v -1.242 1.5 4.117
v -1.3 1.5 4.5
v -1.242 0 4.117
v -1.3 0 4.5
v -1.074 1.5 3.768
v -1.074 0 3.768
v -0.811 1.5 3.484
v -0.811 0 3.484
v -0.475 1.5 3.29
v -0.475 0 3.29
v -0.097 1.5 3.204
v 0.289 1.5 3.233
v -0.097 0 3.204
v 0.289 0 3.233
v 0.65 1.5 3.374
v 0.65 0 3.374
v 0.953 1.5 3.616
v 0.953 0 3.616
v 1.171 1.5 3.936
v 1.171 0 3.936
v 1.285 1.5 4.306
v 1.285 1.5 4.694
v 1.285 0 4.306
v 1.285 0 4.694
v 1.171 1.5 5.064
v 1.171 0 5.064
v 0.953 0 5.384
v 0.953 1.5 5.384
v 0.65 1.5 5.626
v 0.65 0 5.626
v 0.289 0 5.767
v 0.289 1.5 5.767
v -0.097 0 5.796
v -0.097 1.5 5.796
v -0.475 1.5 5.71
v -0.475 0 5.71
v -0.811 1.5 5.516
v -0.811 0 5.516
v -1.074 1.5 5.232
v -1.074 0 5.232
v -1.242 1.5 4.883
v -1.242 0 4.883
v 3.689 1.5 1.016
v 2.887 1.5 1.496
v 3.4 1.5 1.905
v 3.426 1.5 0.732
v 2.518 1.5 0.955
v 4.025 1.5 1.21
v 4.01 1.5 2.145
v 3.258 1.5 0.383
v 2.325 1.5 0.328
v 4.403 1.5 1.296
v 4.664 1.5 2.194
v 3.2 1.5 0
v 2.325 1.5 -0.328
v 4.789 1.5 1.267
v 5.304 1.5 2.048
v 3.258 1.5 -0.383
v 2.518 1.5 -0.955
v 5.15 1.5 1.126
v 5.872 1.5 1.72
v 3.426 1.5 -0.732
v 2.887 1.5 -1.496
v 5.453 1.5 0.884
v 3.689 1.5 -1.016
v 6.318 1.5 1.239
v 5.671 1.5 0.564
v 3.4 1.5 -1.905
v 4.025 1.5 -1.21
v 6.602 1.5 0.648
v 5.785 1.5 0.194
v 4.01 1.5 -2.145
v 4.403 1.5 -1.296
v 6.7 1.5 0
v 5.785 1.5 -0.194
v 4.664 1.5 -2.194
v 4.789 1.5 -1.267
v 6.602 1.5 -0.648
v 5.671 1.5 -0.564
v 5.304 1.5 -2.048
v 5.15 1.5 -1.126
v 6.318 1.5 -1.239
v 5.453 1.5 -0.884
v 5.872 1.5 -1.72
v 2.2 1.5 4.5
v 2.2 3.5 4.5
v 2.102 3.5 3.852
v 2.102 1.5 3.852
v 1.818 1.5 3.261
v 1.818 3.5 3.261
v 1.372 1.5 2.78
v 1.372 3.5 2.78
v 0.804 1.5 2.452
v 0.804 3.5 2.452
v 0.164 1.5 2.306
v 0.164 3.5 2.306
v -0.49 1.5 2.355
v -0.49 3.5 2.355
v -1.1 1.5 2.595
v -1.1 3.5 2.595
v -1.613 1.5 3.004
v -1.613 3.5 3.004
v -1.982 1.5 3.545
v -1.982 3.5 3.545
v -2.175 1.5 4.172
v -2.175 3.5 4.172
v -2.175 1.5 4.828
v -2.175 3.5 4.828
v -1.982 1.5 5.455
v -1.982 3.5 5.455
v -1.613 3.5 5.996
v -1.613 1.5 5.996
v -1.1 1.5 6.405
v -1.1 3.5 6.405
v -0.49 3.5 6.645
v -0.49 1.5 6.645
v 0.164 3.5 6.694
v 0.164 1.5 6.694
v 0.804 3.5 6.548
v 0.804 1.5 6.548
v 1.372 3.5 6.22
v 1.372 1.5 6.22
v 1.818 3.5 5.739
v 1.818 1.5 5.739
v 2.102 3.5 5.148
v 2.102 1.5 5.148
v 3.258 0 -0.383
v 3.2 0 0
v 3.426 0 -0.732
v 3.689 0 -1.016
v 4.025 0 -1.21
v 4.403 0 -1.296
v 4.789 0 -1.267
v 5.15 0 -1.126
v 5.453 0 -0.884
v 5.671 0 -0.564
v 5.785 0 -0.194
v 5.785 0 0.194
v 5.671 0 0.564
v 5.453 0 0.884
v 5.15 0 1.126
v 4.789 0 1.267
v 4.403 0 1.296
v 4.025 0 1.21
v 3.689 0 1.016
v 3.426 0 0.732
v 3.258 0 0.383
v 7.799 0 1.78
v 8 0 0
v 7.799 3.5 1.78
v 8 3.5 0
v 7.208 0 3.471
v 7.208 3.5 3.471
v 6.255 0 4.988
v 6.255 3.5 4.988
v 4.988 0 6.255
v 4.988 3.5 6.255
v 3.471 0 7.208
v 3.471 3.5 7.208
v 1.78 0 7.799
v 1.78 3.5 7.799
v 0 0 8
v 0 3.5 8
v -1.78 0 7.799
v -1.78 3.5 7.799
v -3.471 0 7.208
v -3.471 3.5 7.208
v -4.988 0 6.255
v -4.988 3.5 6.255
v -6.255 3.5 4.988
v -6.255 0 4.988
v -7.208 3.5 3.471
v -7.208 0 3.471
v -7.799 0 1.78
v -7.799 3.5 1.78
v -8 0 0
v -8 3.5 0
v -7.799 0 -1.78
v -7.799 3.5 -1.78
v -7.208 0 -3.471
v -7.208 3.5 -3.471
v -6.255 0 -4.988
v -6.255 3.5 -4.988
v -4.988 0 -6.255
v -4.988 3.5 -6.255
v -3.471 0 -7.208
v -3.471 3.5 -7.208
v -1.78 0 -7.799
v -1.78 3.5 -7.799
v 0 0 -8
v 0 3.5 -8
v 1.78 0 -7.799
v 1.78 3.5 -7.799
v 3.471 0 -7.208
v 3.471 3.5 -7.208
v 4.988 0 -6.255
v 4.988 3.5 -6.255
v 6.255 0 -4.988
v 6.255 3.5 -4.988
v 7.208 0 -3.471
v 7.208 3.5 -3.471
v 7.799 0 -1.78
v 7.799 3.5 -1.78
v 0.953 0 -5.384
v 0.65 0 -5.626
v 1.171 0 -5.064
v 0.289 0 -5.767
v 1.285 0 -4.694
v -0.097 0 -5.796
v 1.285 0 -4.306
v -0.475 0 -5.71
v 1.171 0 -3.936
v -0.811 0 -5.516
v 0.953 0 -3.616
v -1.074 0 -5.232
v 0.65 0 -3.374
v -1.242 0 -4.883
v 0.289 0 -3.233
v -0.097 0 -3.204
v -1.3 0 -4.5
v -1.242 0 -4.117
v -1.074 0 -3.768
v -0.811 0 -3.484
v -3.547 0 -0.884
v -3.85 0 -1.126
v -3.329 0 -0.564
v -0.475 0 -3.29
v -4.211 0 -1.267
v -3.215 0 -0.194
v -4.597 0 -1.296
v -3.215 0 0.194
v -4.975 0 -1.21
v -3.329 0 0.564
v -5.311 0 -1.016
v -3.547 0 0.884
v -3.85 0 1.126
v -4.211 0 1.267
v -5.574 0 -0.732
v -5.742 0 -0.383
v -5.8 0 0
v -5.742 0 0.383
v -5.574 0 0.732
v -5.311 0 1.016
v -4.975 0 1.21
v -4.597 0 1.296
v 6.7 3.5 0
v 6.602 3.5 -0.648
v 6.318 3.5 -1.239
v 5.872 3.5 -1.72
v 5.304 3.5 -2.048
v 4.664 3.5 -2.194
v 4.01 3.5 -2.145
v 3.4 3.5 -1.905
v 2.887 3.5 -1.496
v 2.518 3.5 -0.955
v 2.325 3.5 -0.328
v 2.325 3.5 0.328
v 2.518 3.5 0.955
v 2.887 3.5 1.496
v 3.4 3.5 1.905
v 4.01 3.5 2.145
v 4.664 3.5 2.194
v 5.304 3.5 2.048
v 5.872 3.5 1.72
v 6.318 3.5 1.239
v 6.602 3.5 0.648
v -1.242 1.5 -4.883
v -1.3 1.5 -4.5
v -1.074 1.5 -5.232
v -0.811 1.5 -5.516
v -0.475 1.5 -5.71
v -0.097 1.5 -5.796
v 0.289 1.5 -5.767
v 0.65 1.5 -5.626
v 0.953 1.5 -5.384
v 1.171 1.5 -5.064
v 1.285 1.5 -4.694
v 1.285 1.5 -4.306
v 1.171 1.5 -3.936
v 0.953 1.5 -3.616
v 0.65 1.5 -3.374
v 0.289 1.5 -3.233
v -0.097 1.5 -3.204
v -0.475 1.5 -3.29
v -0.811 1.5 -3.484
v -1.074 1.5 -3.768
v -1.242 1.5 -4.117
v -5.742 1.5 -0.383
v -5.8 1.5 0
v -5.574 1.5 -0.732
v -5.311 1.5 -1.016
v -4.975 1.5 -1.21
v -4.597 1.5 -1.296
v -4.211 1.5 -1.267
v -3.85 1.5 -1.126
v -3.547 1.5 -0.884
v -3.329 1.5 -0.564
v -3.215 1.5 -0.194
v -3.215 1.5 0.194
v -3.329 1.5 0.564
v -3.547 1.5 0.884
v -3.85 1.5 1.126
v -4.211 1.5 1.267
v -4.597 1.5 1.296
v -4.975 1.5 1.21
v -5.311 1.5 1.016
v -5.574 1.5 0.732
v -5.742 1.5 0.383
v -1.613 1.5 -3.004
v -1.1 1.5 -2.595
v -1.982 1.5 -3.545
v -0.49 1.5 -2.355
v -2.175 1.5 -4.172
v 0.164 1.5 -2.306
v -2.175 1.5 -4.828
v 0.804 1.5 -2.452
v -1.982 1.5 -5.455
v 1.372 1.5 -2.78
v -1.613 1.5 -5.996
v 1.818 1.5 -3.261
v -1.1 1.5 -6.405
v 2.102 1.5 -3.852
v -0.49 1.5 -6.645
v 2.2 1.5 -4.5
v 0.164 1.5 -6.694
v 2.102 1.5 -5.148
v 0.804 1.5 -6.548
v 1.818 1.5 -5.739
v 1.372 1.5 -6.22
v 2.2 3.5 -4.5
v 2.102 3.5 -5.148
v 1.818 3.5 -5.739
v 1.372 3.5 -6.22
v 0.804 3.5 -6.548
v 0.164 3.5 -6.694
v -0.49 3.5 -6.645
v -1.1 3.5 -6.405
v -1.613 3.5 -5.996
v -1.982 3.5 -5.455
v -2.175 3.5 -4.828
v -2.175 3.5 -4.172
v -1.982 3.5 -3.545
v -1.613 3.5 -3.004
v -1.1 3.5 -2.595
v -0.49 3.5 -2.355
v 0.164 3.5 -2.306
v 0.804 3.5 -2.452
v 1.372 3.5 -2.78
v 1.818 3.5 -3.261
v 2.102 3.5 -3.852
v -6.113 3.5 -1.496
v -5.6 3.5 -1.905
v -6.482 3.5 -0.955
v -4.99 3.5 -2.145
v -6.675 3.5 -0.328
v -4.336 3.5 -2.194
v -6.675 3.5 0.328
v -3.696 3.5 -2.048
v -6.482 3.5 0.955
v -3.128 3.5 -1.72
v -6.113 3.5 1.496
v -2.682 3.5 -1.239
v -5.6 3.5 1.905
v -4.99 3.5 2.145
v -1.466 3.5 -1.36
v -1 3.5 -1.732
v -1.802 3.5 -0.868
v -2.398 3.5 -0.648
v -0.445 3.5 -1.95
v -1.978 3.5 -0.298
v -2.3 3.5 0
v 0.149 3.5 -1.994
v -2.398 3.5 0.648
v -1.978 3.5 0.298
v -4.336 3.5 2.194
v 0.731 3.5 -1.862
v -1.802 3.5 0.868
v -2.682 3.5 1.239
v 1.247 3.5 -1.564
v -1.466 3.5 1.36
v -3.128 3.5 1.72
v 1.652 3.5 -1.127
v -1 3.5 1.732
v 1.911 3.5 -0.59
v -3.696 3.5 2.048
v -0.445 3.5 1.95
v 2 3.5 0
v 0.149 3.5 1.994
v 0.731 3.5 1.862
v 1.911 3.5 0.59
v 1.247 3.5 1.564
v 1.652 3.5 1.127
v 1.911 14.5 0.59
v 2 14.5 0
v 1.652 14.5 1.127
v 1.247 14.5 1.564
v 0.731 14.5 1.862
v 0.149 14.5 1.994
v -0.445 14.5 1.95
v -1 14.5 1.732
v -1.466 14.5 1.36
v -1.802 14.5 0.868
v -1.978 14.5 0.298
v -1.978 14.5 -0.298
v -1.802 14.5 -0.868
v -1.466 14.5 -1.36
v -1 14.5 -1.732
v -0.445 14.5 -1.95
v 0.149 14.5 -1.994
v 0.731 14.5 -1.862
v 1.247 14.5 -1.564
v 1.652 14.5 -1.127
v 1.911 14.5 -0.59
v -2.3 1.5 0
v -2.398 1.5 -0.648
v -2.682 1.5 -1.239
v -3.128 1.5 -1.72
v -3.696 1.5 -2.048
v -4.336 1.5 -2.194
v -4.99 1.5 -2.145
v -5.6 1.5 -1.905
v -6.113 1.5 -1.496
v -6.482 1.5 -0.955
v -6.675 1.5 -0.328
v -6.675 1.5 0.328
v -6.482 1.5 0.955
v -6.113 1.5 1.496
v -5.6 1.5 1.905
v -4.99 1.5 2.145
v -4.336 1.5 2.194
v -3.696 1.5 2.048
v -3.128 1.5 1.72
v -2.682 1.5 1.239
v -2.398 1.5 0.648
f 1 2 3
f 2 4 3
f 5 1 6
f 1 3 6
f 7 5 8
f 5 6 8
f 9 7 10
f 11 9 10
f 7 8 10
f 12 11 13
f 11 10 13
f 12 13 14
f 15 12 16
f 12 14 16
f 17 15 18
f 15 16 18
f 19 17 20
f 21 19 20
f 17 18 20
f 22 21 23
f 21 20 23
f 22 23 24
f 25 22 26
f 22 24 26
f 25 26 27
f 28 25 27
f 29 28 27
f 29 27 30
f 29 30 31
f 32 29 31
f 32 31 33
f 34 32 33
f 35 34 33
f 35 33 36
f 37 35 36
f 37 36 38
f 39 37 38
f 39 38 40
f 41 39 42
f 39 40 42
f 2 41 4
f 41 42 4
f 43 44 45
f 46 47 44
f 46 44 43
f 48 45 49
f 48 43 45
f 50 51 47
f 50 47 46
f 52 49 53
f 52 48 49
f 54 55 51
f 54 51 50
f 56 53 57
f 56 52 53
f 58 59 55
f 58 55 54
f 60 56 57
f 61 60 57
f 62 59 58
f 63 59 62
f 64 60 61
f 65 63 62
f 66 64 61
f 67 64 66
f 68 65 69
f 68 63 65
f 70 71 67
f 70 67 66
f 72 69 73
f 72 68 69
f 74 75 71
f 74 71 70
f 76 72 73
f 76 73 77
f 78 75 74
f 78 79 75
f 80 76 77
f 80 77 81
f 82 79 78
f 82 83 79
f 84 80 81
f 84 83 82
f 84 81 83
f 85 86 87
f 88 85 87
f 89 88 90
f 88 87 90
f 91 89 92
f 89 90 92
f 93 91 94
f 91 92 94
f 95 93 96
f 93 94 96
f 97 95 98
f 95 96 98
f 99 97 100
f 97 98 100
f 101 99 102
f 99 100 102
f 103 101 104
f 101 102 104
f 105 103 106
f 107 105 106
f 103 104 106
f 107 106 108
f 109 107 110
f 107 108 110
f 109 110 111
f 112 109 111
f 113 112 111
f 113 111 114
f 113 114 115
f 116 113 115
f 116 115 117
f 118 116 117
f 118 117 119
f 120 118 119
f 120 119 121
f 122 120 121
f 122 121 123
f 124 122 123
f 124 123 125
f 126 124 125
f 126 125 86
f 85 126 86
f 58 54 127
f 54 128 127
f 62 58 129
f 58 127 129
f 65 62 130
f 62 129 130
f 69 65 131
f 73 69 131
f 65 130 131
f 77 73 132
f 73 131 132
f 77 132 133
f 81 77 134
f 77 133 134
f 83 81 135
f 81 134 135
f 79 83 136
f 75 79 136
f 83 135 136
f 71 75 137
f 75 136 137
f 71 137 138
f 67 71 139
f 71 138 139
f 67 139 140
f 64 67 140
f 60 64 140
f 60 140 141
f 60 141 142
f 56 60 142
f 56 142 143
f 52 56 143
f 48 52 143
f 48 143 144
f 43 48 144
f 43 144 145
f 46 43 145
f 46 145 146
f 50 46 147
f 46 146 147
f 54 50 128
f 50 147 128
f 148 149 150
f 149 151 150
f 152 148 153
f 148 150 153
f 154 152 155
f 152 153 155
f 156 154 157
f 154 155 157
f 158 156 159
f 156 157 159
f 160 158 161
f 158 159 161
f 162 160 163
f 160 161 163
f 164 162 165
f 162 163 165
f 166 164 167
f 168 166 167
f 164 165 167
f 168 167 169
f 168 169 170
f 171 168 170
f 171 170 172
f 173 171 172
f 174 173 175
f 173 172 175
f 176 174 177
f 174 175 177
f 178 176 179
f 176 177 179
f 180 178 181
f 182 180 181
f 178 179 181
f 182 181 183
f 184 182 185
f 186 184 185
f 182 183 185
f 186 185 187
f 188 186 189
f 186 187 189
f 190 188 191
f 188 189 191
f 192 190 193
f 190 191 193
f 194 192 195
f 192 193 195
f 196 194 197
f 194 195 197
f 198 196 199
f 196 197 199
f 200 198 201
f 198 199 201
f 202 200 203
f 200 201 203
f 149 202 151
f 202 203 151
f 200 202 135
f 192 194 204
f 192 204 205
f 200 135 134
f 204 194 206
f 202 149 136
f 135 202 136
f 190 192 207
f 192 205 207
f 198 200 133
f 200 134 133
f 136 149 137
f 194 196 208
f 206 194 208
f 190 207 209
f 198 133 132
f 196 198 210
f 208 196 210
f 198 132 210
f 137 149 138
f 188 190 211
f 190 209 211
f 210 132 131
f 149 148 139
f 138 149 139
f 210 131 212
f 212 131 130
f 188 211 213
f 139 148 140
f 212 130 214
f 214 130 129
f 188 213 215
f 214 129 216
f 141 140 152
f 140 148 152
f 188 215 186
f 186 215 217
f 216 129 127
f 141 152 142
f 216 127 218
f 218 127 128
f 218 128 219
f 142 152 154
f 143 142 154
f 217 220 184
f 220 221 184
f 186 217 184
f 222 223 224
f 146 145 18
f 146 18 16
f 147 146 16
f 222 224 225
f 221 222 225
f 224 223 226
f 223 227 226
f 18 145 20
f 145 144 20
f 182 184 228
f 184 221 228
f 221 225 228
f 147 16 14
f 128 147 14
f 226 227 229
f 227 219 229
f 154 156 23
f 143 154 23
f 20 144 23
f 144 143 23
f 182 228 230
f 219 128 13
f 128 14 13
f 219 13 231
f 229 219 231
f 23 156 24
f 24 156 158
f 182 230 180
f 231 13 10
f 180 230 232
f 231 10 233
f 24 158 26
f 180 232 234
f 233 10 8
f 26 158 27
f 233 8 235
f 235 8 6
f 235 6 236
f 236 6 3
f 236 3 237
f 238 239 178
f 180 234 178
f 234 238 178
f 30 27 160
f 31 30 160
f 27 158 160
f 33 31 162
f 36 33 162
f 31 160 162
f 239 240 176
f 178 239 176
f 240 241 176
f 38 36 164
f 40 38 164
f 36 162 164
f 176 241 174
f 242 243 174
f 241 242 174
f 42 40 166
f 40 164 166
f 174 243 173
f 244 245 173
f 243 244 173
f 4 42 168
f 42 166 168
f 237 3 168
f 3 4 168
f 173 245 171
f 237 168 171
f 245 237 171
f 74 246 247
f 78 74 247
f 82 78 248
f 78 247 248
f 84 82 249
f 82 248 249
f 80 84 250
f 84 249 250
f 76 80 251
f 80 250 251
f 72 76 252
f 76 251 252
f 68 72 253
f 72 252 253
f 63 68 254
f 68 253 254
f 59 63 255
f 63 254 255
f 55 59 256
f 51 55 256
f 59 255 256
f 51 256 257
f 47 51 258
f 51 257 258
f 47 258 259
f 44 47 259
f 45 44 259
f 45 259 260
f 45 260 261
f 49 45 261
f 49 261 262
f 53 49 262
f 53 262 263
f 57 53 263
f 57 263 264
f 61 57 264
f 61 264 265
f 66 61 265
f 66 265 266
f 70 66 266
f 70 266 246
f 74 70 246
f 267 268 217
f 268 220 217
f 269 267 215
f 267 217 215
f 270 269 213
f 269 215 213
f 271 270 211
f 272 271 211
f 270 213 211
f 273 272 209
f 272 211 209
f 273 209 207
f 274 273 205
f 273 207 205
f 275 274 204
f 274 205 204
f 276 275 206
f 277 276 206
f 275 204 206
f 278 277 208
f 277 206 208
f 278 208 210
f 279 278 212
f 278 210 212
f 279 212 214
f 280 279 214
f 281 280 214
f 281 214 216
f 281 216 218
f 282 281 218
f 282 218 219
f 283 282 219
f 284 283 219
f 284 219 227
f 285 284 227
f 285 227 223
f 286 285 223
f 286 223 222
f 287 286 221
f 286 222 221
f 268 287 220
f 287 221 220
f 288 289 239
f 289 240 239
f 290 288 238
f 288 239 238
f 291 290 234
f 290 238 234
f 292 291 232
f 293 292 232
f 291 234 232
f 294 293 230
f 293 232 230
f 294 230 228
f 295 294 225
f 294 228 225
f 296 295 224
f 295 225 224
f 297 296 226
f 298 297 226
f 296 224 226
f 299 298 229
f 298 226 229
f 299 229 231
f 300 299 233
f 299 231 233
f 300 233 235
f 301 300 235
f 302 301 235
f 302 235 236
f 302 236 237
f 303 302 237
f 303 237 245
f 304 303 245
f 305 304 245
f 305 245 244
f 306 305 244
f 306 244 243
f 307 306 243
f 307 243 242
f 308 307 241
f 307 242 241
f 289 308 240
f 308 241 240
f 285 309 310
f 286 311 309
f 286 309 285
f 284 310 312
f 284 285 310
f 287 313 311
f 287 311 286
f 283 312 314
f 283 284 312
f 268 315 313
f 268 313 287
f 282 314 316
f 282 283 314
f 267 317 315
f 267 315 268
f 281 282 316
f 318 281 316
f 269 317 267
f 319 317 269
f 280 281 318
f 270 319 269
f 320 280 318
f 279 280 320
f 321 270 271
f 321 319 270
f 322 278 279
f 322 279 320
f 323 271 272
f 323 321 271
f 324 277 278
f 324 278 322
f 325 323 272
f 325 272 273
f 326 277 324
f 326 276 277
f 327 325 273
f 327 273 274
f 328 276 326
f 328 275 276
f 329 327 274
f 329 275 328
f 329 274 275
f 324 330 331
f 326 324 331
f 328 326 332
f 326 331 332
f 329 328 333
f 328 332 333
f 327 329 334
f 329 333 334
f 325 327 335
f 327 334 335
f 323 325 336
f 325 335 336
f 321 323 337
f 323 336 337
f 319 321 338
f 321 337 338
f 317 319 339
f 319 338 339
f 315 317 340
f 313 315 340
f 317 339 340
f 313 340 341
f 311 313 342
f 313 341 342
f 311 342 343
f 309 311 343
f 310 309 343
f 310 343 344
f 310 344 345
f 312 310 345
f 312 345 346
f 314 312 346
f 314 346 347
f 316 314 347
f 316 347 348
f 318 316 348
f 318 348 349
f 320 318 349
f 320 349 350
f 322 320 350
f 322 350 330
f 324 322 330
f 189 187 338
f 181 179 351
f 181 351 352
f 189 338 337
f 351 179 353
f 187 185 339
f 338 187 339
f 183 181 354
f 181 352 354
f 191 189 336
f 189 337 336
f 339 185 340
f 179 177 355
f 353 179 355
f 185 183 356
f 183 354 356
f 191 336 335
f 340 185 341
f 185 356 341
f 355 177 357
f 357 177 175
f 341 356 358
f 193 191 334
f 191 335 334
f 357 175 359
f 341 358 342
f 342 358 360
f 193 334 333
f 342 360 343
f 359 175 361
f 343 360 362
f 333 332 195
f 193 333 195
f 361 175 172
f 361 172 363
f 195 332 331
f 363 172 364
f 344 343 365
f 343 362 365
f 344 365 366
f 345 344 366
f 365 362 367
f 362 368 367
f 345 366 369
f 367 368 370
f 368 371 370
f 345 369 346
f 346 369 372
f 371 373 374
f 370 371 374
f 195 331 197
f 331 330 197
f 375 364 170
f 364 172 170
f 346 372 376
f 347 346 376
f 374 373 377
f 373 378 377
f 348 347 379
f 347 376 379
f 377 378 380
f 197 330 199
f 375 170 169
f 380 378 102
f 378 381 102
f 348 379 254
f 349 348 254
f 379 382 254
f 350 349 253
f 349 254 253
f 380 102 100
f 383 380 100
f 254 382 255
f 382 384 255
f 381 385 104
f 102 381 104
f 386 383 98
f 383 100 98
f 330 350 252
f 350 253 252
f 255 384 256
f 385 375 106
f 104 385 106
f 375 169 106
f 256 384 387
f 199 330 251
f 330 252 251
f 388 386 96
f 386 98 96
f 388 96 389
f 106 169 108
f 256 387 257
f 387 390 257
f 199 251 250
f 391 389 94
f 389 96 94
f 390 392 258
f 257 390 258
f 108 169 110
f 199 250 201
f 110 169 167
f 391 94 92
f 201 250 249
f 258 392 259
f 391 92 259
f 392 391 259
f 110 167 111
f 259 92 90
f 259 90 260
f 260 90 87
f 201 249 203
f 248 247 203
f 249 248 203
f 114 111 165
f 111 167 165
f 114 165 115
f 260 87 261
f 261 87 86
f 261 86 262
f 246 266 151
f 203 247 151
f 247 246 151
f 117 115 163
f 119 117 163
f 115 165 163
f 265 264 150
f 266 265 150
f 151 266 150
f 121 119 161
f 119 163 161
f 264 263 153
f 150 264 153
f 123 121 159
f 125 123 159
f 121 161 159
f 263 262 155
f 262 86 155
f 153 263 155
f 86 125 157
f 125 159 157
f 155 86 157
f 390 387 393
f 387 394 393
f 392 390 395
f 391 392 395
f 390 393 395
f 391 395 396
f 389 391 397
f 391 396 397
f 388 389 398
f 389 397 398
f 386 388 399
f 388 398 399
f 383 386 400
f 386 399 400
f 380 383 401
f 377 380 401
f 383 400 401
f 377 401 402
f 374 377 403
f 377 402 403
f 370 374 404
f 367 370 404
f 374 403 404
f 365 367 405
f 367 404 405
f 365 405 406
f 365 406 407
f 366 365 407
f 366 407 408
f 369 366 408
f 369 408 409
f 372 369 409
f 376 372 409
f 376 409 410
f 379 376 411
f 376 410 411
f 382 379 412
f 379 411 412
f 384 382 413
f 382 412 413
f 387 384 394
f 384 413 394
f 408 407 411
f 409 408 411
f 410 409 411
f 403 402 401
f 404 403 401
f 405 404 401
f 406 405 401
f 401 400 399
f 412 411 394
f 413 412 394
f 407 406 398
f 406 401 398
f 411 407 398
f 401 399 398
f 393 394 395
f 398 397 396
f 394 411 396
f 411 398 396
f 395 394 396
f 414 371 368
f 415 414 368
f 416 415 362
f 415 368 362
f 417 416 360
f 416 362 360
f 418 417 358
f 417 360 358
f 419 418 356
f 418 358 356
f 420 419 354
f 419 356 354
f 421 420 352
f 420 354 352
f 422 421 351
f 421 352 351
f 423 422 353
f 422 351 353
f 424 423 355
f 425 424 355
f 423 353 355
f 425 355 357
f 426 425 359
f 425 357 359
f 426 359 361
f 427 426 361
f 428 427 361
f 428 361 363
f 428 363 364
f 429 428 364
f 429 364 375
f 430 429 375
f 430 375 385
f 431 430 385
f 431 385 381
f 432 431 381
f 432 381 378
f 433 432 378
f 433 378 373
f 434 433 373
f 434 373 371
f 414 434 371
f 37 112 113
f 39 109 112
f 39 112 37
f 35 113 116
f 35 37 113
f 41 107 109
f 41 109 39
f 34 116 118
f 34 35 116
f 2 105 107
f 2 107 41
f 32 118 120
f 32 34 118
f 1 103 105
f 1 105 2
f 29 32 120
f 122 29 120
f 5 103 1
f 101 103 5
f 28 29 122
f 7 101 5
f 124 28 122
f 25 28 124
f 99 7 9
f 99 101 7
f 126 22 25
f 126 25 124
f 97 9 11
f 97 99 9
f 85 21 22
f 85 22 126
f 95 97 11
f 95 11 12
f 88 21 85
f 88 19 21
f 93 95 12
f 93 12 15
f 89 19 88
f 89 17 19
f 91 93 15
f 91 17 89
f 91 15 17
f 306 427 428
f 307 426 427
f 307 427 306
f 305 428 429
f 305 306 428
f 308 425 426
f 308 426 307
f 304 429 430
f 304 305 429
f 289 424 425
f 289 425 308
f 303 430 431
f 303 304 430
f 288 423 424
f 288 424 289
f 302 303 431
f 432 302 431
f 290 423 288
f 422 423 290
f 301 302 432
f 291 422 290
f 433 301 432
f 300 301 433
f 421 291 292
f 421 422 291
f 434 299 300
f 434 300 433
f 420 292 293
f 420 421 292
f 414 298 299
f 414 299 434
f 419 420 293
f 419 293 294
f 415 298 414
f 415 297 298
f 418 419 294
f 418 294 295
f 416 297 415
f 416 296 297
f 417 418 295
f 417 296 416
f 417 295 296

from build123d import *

# Parameters (mm, degrees)
CBORE_FOR_M2_SHCS1_D           = 2.6
CBORE_FOR_M2_SHCS1_DEPTH       = 5
CBORE_FOR_M2_SHCS1_CBORE_D     = 4.4
CBORE_FOR_M2_SHCS1_CBORE_DEPTH = 2
CBORE_FOR_M2_SHCS1_TIP         = 0.781118805


with BuildPart() as part:
    # Sketch1 → Revolve1 (revolve)
    with BuildSketch(Plane.XY):
        Polygon((0, 0), (8, 0), (8, 3.5), (2, 3.5), (2, 14.5), (0, 14.5), align=None)
    revolve(axis=Axis((0, 14.5, 0), (0, -1, 0)))

    # CBORE for M2 SHCS1
    with Locations(Plane(origin=(-4.5, 3.5, 0), x_dir=(1, 0, 0), z_dir=(0, 1, 0))):
        with Locations((0, 0), (4.5, 4.5), (9, 0), (4.5, -4.5)):
            CounterBoreHole(CBORE_FOR_M2_SHCS1_D / 2, CBORE_FOR_M2_SHCS1_CBORE_D / 2, CBORE_FOR_M2_SHCS1_CBORE_DEPTH, depth=CBORE_FOR_M2_SHCS1_DEPTH)
            with Locations((0, 0, -(CBORE_FOR_M2_SHCS1_DEPTH + CBORE_FOR_M2_SHCS1_TIP / 2))):  # 118° drill point
                Cone(0, CBORE_FOR_M2_SHCS1_D / 2, CBORE_FOR_M2_SHCS1_TIP, mode=Mode.SUBTRACT)


solid = part.part
